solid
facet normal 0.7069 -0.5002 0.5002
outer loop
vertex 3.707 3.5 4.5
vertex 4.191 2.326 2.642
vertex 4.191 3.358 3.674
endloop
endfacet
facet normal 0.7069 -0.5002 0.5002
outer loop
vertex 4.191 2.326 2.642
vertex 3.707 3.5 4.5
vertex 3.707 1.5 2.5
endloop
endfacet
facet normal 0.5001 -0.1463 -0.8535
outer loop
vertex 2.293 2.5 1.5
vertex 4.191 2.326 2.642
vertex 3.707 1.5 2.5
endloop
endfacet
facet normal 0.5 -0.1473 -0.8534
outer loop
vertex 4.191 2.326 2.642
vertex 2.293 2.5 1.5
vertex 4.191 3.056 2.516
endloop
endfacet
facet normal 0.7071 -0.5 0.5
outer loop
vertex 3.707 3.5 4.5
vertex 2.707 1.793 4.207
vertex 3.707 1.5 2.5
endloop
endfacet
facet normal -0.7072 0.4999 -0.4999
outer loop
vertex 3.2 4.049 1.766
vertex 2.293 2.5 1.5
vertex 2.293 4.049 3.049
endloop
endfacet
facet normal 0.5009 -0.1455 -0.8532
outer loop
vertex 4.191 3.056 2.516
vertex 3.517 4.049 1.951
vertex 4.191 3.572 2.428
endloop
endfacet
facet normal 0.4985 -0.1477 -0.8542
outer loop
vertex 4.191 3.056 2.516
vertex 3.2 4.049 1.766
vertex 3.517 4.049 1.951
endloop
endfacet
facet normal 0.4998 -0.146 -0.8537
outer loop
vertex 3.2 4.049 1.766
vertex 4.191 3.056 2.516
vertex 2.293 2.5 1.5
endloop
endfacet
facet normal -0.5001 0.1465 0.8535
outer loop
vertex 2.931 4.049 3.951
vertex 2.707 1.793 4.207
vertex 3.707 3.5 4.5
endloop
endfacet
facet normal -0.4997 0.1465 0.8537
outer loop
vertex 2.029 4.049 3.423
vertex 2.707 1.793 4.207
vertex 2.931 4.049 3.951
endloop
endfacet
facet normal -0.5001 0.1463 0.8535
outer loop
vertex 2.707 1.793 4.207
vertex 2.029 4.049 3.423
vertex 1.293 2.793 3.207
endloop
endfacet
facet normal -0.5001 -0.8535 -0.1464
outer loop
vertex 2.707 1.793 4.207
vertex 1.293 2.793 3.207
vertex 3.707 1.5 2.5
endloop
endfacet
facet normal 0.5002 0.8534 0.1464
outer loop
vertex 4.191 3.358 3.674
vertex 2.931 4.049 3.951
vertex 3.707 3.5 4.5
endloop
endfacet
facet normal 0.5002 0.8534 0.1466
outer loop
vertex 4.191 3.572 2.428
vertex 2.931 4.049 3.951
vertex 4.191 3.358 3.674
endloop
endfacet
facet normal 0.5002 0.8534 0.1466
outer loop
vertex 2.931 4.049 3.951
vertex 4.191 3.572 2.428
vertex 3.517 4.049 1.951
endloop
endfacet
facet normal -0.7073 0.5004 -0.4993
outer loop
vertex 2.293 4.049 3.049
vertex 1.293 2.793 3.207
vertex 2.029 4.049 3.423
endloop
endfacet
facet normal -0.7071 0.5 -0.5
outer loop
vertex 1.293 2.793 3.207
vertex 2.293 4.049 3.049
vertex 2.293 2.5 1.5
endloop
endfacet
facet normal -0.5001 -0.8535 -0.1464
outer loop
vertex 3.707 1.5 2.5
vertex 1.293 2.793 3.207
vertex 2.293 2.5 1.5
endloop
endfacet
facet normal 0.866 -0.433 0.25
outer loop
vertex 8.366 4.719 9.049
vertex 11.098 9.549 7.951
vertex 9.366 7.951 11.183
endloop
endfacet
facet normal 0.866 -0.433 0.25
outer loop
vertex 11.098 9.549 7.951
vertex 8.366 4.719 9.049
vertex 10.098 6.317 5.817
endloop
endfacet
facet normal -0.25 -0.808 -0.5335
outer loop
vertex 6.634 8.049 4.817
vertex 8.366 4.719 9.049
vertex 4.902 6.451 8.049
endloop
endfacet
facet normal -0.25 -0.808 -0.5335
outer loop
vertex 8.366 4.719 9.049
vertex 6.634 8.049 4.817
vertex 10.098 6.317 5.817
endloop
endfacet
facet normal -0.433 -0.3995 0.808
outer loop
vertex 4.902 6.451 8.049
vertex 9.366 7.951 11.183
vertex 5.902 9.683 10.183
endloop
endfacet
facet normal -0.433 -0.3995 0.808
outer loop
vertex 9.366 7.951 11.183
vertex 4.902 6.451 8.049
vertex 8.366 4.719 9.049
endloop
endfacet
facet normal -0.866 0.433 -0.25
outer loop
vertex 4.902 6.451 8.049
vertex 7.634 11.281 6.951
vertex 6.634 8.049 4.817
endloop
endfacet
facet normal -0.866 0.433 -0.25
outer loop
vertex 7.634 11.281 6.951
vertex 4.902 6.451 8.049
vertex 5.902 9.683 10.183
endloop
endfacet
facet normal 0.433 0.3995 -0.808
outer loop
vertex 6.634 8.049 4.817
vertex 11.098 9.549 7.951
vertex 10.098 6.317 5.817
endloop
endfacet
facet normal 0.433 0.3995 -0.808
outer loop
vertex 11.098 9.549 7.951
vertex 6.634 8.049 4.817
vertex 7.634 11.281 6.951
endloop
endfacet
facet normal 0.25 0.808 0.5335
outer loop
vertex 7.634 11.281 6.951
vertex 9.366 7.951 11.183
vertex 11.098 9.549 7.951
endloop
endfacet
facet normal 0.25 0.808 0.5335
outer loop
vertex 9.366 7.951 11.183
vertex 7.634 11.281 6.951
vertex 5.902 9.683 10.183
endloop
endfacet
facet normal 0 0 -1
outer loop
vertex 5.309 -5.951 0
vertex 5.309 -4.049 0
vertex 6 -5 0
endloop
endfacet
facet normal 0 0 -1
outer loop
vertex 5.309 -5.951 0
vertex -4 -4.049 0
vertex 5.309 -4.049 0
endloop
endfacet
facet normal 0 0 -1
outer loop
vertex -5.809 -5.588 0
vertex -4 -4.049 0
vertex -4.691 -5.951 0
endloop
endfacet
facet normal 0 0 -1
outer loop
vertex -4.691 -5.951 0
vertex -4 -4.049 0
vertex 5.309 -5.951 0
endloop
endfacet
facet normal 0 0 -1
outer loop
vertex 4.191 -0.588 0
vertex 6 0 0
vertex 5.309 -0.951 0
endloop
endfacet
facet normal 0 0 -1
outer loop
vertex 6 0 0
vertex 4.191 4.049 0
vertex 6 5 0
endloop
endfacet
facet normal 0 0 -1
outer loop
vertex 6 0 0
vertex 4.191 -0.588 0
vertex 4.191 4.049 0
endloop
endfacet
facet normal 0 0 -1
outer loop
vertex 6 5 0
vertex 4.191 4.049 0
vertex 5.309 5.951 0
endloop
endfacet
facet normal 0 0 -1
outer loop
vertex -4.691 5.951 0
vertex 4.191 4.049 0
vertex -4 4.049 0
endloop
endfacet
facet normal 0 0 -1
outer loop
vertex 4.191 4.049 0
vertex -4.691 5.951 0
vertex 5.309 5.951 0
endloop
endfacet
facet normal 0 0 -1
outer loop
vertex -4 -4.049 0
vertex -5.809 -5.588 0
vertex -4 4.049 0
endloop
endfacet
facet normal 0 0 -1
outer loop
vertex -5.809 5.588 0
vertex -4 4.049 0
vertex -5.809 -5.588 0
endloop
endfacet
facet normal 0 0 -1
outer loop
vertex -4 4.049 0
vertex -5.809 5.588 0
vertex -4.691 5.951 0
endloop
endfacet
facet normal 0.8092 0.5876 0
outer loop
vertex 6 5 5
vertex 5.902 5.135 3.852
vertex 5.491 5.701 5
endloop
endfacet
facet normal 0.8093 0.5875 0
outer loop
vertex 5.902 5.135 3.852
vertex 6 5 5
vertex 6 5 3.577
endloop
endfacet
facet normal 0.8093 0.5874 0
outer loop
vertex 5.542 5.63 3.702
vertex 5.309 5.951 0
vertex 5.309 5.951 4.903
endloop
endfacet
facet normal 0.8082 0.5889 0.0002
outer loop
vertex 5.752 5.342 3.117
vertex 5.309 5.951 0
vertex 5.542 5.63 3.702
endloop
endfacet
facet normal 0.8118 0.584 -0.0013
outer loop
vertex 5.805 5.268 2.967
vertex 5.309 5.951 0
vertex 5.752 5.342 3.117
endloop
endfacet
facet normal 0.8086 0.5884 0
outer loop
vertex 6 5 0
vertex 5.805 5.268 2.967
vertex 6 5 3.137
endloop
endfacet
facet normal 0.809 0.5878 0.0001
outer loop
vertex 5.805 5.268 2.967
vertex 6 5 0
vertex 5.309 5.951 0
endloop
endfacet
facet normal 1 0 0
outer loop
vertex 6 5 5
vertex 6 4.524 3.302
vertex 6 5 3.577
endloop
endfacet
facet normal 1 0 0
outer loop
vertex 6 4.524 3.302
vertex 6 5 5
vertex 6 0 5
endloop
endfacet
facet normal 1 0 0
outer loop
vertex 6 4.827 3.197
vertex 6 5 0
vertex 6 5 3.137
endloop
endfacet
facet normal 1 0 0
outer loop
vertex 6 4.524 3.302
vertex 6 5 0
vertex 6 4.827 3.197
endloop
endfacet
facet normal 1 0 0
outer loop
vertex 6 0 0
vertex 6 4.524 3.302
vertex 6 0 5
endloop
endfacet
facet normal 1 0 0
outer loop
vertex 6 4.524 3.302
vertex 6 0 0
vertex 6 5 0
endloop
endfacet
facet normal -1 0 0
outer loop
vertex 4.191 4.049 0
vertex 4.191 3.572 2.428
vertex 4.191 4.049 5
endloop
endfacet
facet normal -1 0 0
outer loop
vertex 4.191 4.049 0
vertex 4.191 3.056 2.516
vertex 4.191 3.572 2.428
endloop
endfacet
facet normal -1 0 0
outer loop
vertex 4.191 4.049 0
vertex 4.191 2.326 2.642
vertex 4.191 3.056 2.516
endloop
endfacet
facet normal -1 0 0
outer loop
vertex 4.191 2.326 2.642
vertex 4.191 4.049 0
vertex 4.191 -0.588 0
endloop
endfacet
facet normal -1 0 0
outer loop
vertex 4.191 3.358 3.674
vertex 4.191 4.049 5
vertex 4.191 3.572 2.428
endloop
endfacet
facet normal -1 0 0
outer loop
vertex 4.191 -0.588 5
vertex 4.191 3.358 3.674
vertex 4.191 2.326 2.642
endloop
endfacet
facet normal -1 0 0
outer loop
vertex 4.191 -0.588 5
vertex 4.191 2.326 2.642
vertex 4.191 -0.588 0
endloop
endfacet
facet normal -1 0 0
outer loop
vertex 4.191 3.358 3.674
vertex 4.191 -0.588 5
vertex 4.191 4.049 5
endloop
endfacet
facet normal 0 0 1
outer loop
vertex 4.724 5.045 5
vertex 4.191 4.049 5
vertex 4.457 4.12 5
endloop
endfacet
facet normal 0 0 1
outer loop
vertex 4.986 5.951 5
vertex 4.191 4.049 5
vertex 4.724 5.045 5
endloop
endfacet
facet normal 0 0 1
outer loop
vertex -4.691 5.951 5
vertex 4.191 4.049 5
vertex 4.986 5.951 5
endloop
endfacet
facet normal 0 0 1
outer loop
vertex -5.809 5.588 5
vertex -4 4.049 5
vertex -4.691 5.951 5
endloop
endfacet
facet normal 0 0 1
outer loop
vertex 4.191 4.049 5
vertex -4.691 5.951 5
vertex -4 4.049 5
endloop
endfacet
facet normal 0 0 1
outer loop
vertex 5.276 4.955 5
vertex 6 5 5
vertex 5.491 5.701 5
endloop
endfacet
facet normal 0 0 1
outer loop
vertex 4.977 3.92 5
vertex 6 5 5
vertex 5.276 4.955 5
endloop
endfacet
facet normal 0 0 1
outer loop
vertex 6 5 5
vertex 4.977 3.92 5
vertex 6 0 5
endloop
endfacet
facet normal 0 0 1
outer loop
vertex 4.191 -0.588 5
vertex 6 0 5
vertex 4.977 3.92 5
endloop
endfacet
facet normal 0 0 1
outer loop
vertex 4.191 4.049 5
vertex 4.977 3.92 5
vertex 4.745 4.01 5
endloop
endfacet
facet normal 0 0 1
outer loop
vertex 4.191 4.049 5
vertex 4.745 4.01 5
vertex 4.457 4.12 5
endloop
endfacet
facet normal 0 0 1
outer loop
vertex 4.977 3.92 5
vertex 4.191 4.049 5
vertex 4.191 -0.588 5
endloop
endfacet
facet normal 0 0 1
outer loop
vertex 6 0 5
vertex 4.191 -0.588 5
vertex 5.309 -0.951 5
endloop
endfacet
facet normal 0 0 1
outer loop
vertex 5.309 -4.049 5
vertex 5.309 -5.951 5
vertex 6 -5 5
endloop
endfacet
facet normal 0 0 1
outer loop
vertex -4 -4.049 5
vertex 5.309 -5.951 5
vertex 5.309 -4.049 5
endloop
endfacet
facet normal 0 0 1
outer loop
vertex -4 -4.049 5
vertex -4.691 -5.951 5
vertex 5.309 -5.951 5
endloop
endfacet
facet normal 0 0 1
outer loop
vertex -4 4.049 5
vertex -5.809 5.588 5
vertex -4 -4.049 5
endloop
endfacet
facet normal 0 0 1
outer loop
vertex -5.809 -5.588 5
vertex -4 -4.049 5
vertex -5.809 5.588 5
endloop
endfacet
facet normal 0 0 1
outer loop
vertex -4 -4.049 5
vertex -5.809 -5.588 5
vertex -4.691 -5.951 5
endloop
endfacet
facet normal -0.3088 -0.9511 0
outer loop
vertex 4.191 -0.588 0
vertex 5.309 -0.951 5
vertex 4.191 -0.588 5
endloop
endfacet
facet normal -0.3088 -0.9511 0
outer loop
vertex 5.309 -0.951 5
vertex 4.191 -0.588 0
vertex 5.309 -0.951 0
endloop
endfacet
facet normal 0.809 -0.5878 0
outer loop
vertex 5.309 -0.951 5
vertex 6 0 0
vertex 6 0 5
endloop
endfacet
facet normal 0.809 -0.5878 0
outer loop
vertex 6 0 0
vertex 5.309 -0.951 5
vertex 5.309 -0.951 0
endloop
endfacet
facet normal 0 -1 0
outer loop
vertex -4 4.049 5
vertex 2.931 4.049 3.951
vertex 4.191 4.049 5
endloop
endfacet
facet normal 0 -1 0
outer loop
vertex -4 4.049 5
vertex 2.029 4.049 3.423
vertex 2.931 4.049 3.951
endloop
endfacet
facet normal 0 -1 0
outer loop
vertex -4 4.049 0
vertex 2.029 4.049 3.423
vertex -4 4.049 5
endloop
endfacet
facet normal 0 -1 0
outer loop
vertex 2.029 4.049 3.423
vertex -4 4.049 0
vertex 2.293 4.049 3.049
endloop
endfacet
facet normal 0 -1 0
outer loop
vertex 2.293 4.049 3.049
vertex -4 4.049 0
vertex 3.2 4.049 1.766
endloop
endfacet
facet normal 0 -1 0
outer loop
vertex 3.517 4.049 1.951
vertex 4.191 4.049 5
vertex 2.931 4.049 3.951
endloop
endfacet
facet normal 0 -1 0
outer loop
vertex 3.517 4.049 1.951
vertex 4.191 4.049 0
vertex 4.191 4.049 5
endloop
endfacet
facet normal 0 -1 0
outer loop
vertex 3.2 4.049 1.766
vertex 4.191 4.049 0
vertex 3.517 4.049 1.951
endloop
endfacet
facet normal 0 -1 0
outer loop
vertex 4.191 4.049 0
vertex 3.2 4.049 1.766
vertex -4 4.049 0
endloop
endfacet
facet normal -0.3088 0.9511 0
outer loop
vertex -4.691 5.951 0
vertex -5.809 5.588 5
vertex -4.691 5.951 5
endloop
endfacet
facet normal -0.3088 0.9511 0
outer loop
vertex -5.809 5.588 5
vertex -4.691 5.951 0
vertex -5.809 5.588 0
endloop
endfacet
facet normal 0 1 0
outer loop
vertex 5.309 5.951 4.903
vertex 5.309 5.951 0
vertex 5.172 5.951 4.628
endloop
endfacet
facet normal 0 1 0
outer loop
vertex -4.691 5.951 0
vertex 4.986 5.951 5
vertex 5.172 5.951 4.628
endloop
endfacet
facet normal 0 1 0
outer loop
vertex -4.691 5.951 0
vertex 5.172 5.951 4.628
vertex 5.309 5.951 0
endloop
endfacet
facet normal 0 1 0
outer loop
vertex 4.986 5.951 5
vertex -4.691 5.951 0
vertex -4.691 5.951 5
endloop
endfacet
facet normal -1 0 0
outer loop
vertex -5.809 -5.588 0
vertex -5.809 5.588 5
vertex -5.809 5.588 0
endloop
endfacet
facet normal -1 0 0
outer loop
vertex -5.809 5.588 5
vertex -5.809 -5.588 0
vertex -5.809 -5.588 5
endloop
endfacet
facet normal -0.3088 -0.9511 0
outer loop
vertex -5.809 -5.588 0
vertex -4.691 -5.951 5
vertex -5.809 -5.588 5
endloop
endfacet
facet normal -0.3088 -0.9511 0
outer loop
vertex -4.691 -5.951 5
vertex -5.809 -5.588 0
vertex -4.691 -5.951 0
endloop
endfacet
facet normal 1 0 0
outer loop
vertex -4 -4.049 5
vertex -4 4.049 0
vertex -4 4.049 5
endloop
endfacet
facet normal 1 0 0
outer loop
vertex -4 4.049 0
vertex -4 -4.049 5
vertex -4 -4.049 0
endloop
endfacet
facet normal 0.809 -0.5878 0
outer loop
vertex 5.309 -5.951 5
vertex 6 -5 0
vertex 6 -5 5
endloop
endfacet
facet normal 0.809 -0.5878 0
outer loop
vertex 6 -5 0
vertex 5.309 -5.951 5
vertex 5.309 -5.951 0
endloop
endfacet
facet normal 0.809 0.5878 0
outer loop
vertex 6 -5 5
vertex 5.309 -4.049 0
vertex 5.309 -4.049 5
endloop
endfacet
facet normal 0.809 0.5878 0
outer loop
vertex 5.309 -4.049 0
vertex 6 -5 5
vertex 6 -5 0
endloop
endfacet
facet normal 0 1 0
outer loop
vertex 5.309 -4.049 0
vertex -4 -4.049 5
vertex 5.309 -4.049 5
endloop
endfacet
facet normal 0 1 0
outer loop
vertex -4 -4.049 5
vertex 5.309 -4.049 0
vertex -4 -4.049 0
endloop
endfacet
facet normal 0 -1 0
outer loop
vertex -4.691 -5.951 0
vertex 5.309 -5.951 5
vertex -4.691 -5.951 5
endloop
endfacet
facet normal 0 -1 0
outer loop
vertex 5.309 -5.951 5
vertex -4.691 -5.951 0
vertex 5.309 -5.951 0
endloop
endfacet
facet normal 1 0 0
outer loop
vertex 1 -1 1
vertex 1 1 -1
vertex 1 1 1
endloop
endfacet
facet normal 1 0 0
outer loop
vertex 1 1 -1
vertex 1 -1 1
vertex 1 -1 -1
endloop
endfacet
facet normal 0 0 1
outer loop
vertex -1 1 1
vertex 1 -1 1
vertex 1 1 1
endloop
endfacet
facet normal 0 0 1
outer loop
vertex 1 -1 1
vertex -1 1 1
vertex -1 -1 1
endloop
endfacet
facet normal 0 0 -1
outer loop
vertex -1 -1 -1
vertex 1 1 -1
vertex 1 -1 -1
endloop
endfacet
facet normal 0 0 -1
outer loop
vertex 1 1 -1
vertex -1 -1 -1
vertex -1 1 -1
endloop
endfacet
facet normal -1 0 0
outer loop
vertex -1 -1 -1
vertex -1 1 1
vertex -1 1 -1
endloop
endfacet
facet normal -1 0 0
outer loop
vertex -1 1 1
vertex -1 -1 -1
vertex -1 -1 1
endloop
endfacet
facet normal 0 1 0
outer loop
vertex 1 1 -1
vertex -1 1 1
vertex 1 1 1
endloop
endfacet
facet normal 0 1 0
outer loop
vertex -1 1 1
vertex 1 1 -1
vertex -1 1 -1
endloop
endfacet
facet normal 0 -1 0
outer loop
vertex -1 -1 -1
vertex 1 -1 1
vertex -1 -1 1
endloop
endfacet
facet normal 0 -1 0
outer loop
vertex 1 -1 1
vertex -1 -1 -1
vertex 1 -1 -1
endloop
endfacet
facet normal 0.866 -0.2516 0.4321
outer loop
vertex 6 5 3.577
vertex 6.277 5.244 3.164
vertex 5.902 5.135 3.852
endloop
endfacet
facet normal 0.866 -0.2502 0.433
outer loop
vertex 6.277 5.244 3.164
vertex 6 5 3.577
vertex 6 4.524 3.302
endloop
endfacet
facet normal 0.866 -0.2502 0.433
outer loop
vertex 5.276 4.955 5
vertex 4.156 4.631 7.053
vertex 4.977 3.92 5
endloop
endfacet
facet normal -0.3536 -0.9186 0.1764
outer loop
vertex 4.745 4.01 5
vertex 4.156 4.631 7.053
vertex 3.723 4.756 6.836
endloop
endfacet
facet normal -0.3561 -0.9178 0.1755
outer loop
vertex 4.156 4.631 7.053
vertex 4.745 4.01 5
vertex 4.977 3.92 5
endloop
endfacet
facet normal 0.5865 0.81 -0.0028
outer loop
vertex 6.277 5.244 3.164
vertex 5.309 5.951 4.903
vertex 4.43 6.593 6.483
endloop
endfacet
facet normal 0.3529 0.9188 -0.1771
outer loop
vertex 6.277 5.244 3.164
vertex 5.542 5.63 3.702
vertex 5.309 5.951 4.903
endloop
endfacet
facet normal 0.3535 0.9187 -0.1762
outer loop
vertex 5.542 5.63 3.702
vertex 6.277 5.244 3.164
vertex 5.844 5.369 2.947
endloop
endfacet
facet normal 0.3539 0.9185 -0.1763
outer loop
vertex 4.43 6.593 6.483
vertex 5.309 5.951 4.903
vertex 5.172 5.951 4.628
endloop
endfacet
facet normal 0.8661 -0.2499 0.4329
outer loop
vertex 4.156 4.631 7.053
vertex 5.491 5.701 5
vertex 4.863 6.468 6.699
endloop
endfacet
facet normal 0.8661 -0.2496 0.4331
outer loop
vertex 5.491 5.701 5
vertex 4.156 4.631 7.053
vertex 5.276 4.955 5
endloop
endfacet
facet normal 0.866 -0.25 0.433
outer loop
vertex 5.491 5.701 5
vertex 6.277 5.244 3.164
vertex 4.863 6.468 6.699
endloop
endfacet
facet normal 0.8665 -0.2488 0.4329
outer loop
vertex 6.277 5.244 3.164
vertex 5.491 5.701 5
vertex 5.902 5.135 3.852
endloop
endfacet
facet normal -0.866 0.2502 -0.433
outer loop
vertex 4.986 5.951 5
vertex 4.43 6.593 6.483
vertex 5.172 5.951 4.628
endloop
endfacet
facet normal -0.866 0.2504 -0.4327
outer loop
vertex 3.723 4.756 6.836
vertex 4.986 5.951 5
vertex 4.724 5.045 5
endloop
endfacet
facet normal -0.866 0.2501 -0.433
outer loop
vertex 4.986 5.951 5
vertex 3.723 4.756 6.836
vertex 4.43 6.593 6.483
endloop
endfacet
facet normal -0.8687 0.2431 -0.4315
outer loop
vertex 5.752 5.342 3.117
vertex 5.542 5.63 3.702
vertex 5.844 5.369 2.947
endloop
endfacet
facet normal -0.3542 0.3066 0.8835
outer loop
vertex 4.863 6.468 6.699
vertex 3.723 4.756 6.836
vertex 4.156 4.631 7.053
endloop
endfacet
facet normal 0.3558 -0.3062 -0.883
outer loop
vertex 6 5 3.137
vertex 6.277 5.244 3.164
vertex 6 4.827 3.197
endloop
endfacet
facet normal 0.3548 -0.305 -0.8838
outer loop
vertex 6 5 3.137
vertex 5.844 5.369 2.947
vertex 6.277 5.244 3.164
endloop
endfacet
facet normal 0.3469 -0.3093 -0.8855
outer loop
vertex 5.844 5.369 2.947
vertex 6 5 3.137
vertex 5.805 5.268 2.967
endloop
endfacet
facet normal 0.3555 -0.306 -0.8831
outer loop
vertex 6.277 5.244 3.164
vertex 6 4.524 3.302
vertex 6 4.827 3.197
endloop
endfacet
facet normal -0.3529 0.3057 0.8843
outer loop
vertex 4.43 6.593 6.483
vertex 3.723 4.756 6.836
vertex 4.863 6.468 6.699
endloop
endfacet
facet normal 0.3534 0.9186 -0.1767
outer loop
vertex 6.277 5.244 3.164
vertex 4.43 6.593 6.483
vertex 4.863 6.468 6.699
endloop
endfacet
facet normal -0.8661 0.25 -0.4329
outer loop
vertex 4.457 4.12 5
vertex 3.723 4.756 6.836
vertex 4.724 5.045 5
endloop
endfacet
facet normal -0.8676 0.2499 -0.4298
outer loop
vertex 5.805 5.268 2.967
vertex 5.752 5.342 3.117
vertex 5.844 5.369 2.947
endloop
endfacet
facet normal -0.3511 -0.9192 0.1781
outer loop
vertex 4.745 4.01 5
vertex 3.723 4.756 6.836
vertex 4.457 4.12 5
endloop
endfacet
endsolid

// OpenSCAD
cube([2,2,2],true);

transform2([[1,2,0.25],[30,60,45],[5,5,5]])
cube([2,2,2],true);

pattern
(
[
[[1,1,1],[45,45,45],[3,3,3]],
[[2,2,2],[60,60,60],[8,8,8]]
]
)
cube([2,2,2],true);

hull_pattern
(
[
[[1,1,1],[0,0,0],[5,0,0]],
[[1,1,1],[0,0,0],[5,5,0]],
[[1,1,1],[0,0,0],[-5,5,0]],
[[1,1,1],[0,0,0],[-5,-5,0]],
[[1,1,1],[0,0,0],[5,-5,0]]
]
)
cylinder(r1=1,r2=1,h=5);

module transform(s, angle, displacement)
{
    translate(displacement)
    rotate([angle[0],0,0])
    rotate([0,angle[1],0])
    rotate([0,0,angle[2]])

    scale(s)
    children();
}

module transform2(t)
{
    transform(t[0],t[1],t[2])
    children();
}

///Duplicates an object in each specified place.
///p: The list of locations.
module pattern(p)
{
    for(x=p)
    {
        transform2(x)
        children();
    }
}

///Creates a convex hull between each pair of successive objects.
///p: The list of locations.
module hull_pattern(p)
{
    for(x=[0:len(p)-2])
    {
        hull()
        {
            transform2(p[x])
            children();
            transform2(p[x+1])
            children();
        }
    }
}

///Creates a convex hull between each pair of objects.
///p: The list of locations.
module web_pattern(p)
{
    for(x=[0:len(p)-2])
    {
        for(y=[x:len(p)-1])
        {
            hull()
            {
                transform2(p[x])
                children();
                transform2(p[y])
                children();
            }
        }
    }
}

function transformation(scaling,rotation,displacement)=[scaling,rotation,displacement];
